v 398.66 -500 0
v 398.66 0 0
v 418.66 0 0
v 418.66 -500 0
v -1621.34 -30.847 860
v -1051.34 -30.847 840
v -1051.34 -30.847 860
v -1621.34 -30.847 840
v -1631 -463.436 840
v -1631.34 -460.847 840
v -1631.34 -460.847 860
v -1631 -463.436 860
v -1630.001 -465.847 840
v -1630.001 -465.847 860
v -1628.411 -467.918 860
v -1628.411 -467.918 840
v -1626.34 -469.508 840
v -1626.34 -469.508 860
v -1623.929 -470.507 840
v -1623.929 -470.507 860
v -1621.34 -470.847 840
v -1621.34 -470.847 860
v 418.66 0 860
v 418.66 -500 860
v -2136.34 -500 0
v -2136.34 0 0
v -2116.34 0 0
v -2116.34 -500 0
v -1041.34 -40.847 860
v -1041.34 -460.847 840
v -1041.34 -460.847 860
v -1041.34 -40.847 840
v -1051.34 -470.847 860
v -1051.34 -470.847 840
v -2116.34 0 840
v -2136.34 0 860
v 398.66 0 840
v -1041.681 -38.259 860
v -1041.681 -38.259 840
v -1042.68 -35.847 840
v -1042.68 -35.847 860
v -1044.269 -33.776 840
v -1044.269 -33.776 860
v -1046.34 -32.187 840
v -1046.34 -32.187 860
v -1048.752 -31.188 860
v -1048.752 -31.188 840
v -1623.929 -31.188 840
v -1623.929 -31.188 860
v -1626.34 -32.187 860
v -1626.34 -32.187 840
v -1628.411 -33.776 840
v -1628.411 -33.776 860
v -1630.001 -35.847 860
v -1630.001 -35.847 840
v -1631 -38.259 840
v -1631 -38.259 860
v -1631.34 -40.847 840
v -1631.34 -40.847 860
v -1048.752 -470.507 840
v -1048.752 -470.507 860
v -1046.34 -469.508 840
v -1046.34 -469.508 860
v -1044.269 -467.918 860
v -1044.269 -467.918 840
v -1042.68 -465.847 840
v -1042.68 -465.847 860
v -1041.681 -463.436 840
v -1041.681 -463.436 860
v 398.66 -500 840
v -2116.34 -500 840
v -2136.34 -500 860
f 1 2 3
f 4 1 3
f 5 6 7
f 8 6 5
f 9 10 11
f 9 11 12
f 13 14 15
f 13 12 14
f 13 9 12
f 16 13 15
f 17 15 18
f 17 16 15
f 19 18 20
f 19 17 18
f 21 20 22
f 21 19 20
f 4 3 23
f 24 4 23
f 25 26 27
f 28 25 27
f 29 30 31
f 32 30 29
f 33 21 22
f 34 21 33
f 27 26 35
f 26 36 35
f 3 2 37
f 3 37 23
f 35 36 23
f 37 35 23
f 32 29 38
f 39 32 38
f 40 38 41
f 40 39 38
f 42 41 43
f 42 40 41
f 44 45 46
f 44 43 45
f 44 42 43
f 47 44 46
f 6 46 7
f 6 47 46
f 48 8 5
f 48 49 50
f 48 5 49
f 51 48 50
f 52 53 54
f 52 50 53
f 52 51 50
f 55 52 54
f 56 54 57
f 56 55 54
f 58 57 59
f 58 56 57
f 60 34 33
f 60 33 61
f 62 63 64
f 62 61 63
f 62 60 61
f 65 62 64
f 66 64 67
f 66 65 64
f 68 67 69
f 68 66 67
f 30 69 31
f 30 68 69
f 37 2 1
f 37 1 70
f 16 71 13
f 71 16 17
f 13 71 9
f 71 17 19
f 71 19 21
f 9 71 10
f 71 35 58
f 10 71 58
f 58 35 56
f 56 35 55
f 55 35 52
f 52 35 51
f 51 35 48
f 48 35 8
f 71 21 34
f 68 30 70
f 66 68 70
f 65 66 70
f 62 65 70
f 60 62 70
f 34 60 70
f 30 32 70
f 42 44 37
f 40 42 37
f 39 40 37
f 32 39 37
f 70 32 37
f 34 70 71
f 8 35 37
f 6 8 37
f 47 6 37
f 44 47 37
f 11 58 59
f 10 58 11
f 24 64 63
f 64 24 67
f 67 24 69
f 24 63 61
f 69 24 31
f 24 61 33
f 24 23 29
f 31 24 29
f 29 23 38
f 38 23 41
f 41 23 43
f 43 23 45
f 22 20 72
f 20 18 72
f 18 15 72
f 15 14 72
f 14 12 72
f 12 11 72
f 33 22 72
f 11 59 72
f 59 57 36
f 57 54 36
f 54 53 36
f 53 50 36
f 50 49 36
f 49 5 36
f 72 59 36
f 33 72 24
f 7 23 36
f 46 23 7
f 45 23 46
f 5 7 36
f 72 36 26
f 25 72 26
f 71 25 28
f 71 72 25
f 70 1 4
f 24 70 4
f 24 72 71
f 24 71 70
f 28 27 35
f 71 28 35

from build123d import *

# Parameters (mm, degrees)
F0_W     = 20
F0_H     = 840
F1_DEPTH = 500
F3_DEPTH = 1397


with BuildPart() as f1:
    # F0 (on Front) → F1 (new body)
    with BuildSketch(Plane.XZ):
        with Locations((-2126.34038, 420)):
            Rectangle(F0_W, F0_H)
        Polygon((-2136.34038, 860), (-2136.34038, 840), (-2116.34038, 840), (398.65962, 840), (418.65962, 840), (418.65962, 860), align=None)
        with Locations((408.65962, 420)):
            Rectangle(F0_W, F0_H)
    extrude(amount=F1_DEPTH)

    # F2 (on Top) → F3 (cut)
    with BuildSketch(Plane.XY):
        with BuildLine():
            Line((-1621.34038, -470.847369), (-1051.34038, -470.847369))
            ThreePointArc((-1051.34038, -470.847369), (-1044.269312, -467.918437), (-1041.34038, -460.847369))
            Line((-1041.34038, -460.847369), (-1041.34038, -40.847369))
            ThreePointArc((-1041.34038, -40.847369), (-1044.269312, -33.776302), (-1051.34038, -30.847369))
            Line((-1051.34038, -30.847369), (-1621.34038, -30.847369))
            ThreePointArc((-1621.34038, -30.847369), (-1628.411448, -33.776302), (-1631.34038, -40.847369))
            Line((-1631.34038, -40.847369), (-1631.34038, -460.847369))
            ThreePointArc((-1631.34038, -460.847369), (-1628.411448, -467.918437), (-1621.34038, -470.847369))
        make_face()
    extrude(amount=F3_DEPTH, mode=Mode.SUBTRACT)


solid = f1.part
